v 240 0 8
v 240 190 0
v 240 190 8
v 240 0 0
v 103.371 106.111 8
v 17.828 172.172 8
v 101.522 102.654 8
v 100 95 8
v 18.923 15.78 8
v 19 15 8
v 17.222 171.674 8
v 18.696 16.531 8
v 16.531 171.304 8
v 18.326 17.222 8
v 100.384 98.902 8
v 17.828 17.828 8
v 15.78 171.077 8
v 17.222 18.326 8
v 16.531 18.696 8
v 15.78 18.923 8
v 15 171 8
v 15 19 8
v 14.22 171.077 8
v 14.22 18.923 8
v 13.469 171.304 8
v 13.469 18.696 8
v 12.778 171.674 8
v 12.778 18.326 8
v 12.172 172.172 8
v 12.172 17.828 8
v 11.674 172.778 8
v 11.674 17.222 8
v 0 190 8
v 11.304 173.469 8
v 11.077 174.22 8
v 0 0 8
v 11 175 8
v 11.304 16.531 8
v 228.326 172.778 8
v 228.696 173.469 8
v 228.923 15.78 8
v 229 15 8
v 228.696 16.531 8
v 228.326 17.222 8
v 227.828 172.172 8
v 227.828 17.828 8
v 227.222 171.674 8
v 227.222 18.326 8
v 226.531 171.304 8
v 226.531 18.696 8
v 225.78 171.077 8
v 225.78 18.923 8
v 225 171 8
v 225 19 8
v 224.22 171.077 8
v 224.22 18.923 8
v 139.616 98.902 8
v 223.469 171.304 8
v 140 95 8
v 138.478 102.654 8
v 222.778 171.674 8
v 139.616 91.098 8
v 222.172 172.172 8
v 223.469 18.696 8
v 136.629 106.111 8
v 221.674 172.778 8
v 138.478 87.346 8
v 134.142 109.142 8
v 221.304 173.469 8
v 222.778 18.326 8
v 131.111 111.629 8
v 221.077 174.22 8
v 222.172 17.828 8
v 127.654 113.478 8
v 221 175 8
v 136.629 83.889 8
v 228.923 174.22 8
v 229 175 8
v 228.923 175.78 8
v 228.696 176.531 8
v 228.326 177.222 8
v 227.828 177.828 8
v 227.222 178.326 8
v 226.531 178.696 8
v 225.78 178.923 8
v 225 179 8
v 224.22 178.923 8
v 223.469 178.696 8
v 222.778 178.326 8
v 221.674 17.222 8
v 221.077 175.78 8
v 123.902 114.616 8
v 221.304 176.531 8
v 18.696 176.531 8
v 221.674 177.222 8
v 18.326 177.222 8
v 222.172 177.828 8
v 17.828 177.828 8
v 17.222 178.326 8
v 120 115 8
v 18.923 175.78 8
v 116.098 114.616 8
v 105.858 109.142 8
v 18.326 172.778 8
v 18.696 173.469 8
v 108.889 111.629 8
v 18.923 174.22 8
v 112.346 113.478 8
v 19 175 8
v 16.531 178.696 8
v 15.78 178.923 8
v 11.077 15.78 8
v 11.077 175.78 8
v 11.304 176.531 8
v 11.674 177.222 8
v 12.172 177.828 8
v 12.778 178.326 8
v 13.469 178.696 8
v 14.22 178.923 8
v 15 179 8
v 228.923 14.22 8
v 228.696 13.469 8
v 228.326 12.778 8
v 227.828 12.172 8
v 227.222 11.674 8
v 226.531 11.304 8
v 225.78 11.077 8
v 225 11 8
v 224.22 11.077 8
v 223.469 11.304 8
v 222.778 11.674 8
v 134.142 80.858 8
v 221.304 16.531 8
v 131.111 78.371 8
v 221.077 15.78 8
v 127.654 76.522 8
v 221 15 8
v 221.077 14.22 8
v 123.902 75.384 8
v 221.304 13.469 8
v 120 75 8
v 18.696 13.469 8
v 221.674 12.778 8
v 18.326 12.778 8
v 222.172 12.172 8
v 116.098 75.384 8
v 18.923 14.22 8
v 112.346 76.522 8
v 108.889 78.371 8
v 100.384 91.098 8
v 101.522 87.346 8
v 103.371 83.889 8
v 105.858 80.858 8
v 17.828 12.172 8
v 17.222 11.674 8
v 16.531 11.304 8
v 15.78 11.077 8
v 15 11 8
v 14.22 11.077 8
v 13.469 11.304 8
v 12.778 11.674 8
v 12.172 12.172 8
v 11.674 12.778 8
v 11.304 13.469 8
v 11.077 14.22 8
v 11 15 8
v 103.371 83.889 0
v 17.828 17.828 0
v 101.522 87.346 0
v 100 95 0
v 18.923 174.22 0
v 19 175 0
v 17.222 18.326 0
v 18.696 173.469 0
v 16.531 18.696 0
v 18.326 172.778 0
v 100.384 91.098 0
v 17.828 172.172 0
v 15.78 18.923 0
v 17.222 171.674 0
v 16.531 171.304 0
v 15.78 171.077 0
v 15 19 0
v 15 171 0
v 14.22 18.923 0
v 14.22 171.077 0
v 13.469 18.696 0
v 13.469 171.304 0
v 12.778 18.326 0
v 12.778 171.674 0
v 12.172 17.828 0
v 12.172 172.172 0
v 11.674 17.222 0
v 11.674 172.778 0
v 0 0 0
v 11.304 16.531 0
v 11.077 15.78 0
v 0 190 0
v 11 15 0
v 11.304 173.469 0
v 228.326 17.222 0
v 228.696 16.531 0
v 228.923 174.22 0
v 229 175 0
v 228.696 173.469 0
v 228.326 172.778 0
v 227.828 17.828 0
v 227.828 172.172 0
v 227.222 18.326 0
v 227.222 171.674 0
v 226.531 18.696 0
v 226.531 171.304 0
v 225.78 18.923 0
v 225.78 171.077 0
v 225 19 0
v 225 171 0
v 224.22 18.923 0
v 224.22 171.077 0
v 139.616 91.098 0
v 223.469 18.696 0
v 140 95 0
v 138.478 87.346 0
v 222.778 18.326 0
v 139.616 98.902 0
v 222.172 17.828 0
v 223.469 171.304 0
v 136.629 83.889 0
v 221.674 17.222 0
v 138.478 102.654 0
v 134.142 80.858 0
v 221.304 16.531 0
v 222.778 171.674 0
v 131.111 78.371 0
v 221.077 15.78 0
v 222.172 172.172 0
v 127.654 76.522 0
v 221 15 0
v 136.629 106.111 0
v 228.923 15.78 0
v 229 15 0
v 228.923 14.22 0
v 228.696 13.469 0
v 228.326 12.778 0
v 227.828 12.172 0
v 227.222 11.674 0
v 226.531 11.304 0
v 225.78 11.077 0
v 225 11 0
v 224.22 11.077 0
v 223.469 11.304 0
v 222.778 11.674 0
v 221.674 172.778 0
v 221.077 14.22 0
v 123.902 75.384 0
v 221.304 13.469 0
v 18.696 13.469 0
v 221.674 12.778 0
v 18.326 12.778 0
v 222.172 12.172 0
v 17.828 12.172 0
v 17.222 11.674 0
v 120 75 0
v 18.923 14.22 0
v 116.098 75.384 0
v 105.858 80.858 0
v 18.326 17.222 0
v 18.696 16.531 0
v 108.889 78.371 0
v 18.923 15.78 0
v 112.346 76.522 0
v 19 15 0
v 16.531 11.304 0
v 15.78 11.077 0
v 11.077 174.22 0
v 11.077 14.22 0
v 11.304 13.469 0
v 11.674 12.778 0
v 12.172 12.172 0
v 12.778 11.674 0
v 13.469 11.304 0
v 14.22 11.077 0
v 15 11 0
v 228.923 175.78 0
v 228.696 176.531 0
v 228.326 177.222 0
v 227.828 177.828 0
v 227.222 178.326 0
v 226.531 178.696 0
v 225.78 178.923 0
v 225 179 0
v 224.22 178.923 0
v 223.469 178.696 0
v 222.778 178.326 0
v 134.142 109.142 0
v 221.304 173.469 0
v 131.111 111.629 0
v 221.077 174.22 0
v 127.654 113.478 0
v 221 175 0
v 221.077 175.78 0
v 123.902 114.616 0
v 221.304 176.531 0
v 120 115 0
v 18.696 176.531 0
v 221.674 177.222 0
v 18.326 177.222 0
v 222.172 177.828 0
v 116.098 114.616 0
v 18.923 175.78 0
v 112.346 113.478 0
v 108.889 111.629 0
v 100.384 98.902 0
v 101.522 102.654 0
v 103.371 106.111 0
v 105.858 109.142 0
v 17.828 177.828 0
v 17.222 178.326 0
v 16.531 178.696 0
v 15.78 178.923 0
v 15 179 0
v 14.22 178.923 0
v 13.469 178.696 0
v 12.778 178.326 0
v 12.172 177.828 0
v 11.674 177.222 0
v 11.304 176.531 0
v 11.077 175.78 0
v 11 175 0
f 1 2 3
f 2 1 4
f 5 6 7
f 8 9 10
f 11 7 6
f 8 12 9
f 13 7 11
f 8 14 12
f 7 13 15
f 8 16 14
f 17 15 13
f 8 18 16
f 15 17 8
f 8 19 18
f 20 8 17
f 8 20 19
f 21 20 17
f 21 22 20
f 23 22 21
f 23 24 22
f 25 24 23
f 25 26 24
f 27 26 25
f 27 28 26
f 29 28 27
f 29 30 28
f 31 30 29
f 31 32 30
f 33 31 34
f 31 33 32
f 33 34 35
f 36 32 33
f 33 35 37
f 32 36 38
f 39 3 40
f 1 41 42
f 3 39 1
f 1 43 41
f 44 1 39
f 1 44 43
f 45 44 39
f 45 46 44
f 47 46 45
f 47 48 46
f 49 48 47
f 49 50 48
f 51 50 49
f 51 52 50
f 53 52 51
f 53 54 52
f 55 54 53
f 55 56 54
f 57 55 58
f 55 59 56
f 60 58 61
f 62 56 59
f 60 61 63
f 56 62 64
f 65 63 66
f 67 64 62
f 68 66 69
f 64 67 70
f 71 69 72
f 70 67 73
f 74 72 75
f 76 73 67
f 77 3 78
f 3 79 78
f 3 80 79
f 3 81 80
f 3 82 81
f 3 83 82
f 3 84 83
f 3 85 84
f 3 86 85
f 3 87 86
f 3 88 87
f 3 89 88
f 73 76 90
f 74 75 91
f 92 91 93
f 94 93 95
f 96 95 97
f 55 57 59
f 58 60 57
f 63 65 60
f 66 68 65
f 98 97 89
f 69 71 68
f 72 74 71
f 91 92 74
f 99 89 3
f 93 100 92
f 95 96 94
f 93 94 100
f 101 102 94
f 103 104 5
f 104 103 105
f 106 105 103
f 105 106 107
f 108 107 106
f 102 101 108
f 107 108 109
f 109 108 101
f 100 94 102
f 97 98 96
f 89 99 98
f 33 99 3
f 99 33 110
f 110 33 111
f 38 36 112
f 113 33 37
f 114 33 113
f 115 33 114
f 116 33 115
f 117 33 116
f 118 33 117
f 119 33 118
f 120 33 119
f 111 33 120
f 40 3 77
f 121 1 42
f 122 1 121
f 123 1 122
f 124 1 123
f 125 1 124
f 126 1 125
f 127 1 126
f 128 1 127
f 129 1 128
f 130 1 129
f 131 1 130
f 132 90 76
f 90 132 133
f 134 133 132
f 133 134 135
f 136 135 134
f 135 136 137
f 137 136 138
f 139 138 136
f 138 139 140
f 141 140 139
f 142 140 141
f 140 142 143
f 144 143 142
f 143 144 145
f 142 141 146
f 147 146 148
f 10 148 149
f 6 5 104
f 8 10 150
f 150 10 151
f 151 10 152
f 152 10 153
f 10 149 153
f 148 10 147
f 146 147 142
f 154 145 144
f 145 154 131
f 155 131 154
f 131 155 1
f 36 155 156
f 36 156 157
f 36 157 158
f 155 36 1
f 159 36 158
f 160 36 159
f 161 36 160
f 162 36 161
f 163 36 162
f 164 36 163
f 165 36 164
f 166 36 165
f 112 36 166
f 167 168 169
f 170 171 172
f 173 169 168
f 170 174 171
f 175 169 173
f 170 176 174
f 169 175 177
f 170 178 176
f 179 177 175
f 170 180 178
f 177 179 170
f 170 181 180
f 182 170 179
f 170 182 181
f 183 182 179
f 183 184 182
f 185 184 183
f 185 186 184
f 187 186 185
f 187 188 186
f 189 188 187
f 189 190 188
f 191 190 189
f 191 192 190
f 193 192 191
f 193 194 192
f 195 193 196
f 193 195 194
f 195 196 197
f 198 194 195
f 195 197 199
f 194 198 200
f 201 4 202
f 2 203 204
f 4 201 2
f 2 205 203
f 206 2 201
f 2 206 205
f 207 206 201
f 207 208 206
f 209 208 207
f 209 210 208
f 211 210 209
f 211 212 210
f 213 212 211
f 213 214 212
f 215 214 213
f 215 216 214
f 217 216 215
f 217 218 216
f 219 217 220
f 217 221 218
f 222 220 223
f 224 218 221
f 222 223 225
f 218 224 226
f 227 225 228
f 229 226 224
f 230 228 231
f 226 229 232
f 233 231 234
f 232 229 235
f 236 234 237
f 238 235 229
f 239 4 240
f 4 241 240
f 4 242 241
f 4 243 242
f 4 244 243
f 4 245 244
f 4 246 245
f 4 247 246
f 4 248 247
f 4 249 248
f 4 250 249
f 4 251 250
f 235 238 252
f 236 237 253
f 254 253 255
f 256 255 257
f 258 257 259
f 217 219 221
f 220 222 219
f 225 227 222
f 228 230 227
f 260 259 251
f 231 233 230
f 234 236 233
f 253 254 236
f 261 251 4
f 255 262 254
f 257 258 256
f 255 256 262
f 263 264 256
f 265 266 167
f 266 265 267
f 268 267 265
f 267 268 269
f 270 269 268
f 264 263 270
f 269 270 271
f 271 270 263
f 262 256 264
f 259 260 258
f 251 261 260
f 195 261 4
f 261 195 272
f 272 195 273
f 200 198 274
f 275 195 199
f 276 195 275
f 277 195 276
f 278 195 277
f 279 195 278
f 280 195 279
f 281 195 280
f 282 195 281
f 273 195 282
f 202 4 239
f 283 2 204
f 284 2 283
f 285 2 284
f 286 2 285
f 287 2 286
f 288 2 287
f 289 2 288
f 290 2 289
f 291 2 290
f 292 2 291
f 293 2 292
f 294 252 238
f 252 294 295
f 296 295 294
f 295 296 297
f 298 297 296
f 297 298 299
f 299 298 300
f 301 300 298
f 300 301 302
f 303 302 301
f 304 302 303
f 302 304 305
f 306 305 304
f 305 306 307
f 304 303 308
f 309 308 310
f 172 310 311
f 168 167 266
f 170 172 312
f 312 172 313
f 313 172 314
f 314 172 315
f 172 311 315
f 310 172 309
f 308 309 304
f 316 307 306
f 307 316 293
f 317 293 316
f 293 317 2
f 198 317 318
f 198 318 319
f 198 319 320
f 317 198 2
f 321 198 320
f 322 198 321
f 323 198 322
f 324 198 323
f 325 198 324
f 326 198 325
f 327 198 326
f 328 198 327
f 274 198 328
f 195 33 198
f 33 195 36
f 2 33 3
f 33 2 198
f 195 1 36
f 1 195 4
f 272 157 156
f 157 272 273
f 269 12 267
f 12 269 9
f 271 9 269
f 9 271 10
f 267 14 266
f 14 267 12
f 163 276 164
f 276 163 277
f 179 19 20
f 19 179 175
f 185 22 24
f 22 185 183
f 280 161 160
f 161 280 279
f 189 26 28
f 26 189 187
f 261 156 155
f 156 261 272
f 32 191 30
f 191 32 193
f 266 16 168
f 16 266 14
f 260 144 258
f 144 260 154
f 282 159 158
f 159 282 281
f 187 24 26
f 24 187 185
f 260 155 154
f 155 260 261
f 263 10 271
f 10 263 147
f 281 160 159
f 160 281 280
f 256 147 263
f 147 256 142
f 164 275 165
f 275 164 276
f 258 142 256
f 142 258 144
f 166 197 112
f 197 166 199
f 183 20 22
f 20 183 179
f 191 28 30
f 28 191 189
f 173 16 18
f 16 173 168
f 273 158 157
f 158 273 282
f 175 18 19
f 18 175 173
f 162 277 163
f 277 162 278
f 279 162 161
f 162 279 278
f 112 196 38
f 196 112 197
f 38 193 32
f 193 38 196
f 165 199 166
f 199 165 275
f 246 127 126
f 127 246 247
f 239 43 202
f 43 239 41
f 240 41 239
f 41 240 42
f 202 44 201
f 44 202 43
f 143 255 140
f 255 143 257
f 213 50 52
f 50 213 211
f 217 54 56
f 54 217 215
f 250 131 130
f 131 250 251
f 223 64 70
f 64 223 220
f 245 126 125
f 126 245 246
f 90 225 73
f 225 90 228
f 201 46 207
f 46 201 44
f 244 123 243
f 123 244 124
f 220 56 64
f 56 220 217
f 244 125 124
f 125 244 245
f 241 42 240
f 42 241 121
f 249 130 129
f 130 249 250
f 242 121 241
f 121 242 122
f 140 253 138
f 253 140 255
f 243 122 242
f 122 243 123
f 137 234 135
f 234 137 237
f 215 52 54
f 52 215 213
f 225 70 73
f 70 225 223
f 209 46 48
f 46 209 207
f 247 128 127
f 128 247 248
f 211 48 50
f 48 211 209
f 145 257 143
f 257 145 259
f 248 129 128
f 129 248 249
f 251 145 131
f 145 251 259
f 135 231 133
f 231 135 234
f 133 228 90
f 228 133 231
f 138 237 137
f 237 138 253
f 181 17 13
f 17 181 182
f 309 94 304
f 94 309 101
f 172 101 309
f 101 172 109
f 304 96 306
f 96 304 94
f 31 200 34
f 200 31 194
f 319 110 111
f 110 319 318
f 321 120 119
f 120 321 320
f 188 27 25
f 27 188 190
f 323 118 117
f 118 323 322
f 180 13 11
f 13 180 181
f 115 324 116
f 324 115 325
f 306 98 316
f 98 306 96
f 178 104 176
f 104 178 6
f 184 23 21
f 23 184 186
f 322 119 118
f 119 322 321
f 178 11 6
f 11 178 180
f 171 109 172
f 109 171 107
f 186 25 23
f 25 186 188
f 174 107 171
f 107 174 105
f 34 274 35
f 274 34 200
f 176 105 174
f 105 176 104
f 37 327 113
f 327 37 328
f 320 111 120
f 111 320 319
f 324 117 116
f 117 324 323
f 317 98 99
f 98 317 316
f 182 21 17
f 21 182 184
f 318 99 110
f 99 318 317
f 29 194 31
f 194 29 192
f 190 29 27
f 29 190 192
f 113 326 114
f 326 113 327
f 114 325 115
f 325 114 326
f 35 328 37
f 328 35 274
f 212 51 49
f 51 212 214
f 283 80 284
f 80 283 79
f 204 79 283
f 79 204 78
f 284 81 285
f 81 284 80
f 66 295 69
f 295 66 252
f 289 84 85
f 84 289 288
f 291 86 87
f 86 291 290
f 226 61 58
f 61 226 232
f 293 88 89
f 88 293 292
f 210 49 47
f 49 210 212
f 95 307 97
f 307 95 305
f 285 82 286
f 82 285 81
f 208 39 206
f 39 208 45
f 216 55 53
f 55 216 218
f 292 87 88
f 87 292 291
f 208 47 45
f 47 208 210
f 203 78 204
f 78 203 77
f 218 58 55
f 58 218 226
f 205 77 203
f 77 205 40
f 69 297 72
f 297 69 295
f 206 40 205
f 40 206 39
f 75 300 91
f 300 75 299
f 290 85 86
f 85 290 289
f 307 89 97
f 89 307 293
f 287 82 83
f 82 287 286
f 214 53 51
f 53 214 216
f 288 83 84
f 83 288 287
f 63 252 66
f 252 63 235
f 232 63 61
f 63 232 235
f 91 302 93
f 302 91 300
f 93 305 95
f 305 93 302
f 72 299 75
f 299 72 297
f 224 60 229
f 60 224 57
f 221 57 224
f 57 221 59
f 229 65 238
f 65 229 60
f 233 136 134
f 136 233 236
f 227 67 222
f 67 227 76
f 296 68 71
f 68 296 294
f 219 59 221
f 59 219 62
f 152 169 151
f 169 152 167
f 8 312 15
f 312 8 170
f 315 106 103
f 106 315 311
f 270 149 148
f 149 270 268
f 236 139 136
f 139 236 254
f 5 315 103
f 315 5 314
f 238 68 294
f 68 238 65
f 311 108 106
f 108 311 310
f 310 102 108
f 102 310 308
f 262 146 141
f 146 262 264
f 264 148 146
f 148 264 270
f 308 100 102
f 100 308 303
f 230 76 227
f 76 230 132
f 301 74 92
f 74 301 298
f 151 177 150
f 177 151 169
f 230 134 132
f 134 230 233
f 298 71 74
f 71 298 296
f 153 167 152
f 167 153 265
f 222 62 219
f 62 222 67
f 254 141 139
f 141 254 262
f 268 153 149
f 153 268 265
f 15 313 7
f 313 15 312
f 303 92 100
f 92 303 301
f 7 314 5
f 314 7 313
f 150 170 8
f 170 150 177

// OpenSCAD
$fn = 32;

// ----------------------------------------------------------------------
// Big plate: 200-250 mm adapter plate
// ----------------------------------------------------------------------

// --- parameters (mm) ---
plate_l = 240;            // plate length, X
plate_w = 190;            // plate width, Y
plate_t = 8;              // plate thickness, Z
corner_d = 8;             // corner hole diameter
corner_in = 15;           // corner hole inset from the edges
bore_d = 40;              // central bore

difference() {
  cube([plate_l, plate_w, plate_t]);
  translate([corner_in, corner_in, -1]) cylinder(h = plate_t + 2, d = corner_d);
  translate([plate_l - corner_in, corner_in, -1]) cylinder(h = plate_t + 2, d = corner_d);
  translate([corner_in, plate_w - corner_in, -1]) cylinder(h = plate_t + 2, d = corner_d);
  translate([plate_l - corner_in, plate_w - corner_in, -1]) cylinder(h = plate_t + 2, d = corner_d);
  translate([plate_l / 2, plate_w / 2, -1]) cylinder(h = plate_t + 2, d = bore_d);
}
